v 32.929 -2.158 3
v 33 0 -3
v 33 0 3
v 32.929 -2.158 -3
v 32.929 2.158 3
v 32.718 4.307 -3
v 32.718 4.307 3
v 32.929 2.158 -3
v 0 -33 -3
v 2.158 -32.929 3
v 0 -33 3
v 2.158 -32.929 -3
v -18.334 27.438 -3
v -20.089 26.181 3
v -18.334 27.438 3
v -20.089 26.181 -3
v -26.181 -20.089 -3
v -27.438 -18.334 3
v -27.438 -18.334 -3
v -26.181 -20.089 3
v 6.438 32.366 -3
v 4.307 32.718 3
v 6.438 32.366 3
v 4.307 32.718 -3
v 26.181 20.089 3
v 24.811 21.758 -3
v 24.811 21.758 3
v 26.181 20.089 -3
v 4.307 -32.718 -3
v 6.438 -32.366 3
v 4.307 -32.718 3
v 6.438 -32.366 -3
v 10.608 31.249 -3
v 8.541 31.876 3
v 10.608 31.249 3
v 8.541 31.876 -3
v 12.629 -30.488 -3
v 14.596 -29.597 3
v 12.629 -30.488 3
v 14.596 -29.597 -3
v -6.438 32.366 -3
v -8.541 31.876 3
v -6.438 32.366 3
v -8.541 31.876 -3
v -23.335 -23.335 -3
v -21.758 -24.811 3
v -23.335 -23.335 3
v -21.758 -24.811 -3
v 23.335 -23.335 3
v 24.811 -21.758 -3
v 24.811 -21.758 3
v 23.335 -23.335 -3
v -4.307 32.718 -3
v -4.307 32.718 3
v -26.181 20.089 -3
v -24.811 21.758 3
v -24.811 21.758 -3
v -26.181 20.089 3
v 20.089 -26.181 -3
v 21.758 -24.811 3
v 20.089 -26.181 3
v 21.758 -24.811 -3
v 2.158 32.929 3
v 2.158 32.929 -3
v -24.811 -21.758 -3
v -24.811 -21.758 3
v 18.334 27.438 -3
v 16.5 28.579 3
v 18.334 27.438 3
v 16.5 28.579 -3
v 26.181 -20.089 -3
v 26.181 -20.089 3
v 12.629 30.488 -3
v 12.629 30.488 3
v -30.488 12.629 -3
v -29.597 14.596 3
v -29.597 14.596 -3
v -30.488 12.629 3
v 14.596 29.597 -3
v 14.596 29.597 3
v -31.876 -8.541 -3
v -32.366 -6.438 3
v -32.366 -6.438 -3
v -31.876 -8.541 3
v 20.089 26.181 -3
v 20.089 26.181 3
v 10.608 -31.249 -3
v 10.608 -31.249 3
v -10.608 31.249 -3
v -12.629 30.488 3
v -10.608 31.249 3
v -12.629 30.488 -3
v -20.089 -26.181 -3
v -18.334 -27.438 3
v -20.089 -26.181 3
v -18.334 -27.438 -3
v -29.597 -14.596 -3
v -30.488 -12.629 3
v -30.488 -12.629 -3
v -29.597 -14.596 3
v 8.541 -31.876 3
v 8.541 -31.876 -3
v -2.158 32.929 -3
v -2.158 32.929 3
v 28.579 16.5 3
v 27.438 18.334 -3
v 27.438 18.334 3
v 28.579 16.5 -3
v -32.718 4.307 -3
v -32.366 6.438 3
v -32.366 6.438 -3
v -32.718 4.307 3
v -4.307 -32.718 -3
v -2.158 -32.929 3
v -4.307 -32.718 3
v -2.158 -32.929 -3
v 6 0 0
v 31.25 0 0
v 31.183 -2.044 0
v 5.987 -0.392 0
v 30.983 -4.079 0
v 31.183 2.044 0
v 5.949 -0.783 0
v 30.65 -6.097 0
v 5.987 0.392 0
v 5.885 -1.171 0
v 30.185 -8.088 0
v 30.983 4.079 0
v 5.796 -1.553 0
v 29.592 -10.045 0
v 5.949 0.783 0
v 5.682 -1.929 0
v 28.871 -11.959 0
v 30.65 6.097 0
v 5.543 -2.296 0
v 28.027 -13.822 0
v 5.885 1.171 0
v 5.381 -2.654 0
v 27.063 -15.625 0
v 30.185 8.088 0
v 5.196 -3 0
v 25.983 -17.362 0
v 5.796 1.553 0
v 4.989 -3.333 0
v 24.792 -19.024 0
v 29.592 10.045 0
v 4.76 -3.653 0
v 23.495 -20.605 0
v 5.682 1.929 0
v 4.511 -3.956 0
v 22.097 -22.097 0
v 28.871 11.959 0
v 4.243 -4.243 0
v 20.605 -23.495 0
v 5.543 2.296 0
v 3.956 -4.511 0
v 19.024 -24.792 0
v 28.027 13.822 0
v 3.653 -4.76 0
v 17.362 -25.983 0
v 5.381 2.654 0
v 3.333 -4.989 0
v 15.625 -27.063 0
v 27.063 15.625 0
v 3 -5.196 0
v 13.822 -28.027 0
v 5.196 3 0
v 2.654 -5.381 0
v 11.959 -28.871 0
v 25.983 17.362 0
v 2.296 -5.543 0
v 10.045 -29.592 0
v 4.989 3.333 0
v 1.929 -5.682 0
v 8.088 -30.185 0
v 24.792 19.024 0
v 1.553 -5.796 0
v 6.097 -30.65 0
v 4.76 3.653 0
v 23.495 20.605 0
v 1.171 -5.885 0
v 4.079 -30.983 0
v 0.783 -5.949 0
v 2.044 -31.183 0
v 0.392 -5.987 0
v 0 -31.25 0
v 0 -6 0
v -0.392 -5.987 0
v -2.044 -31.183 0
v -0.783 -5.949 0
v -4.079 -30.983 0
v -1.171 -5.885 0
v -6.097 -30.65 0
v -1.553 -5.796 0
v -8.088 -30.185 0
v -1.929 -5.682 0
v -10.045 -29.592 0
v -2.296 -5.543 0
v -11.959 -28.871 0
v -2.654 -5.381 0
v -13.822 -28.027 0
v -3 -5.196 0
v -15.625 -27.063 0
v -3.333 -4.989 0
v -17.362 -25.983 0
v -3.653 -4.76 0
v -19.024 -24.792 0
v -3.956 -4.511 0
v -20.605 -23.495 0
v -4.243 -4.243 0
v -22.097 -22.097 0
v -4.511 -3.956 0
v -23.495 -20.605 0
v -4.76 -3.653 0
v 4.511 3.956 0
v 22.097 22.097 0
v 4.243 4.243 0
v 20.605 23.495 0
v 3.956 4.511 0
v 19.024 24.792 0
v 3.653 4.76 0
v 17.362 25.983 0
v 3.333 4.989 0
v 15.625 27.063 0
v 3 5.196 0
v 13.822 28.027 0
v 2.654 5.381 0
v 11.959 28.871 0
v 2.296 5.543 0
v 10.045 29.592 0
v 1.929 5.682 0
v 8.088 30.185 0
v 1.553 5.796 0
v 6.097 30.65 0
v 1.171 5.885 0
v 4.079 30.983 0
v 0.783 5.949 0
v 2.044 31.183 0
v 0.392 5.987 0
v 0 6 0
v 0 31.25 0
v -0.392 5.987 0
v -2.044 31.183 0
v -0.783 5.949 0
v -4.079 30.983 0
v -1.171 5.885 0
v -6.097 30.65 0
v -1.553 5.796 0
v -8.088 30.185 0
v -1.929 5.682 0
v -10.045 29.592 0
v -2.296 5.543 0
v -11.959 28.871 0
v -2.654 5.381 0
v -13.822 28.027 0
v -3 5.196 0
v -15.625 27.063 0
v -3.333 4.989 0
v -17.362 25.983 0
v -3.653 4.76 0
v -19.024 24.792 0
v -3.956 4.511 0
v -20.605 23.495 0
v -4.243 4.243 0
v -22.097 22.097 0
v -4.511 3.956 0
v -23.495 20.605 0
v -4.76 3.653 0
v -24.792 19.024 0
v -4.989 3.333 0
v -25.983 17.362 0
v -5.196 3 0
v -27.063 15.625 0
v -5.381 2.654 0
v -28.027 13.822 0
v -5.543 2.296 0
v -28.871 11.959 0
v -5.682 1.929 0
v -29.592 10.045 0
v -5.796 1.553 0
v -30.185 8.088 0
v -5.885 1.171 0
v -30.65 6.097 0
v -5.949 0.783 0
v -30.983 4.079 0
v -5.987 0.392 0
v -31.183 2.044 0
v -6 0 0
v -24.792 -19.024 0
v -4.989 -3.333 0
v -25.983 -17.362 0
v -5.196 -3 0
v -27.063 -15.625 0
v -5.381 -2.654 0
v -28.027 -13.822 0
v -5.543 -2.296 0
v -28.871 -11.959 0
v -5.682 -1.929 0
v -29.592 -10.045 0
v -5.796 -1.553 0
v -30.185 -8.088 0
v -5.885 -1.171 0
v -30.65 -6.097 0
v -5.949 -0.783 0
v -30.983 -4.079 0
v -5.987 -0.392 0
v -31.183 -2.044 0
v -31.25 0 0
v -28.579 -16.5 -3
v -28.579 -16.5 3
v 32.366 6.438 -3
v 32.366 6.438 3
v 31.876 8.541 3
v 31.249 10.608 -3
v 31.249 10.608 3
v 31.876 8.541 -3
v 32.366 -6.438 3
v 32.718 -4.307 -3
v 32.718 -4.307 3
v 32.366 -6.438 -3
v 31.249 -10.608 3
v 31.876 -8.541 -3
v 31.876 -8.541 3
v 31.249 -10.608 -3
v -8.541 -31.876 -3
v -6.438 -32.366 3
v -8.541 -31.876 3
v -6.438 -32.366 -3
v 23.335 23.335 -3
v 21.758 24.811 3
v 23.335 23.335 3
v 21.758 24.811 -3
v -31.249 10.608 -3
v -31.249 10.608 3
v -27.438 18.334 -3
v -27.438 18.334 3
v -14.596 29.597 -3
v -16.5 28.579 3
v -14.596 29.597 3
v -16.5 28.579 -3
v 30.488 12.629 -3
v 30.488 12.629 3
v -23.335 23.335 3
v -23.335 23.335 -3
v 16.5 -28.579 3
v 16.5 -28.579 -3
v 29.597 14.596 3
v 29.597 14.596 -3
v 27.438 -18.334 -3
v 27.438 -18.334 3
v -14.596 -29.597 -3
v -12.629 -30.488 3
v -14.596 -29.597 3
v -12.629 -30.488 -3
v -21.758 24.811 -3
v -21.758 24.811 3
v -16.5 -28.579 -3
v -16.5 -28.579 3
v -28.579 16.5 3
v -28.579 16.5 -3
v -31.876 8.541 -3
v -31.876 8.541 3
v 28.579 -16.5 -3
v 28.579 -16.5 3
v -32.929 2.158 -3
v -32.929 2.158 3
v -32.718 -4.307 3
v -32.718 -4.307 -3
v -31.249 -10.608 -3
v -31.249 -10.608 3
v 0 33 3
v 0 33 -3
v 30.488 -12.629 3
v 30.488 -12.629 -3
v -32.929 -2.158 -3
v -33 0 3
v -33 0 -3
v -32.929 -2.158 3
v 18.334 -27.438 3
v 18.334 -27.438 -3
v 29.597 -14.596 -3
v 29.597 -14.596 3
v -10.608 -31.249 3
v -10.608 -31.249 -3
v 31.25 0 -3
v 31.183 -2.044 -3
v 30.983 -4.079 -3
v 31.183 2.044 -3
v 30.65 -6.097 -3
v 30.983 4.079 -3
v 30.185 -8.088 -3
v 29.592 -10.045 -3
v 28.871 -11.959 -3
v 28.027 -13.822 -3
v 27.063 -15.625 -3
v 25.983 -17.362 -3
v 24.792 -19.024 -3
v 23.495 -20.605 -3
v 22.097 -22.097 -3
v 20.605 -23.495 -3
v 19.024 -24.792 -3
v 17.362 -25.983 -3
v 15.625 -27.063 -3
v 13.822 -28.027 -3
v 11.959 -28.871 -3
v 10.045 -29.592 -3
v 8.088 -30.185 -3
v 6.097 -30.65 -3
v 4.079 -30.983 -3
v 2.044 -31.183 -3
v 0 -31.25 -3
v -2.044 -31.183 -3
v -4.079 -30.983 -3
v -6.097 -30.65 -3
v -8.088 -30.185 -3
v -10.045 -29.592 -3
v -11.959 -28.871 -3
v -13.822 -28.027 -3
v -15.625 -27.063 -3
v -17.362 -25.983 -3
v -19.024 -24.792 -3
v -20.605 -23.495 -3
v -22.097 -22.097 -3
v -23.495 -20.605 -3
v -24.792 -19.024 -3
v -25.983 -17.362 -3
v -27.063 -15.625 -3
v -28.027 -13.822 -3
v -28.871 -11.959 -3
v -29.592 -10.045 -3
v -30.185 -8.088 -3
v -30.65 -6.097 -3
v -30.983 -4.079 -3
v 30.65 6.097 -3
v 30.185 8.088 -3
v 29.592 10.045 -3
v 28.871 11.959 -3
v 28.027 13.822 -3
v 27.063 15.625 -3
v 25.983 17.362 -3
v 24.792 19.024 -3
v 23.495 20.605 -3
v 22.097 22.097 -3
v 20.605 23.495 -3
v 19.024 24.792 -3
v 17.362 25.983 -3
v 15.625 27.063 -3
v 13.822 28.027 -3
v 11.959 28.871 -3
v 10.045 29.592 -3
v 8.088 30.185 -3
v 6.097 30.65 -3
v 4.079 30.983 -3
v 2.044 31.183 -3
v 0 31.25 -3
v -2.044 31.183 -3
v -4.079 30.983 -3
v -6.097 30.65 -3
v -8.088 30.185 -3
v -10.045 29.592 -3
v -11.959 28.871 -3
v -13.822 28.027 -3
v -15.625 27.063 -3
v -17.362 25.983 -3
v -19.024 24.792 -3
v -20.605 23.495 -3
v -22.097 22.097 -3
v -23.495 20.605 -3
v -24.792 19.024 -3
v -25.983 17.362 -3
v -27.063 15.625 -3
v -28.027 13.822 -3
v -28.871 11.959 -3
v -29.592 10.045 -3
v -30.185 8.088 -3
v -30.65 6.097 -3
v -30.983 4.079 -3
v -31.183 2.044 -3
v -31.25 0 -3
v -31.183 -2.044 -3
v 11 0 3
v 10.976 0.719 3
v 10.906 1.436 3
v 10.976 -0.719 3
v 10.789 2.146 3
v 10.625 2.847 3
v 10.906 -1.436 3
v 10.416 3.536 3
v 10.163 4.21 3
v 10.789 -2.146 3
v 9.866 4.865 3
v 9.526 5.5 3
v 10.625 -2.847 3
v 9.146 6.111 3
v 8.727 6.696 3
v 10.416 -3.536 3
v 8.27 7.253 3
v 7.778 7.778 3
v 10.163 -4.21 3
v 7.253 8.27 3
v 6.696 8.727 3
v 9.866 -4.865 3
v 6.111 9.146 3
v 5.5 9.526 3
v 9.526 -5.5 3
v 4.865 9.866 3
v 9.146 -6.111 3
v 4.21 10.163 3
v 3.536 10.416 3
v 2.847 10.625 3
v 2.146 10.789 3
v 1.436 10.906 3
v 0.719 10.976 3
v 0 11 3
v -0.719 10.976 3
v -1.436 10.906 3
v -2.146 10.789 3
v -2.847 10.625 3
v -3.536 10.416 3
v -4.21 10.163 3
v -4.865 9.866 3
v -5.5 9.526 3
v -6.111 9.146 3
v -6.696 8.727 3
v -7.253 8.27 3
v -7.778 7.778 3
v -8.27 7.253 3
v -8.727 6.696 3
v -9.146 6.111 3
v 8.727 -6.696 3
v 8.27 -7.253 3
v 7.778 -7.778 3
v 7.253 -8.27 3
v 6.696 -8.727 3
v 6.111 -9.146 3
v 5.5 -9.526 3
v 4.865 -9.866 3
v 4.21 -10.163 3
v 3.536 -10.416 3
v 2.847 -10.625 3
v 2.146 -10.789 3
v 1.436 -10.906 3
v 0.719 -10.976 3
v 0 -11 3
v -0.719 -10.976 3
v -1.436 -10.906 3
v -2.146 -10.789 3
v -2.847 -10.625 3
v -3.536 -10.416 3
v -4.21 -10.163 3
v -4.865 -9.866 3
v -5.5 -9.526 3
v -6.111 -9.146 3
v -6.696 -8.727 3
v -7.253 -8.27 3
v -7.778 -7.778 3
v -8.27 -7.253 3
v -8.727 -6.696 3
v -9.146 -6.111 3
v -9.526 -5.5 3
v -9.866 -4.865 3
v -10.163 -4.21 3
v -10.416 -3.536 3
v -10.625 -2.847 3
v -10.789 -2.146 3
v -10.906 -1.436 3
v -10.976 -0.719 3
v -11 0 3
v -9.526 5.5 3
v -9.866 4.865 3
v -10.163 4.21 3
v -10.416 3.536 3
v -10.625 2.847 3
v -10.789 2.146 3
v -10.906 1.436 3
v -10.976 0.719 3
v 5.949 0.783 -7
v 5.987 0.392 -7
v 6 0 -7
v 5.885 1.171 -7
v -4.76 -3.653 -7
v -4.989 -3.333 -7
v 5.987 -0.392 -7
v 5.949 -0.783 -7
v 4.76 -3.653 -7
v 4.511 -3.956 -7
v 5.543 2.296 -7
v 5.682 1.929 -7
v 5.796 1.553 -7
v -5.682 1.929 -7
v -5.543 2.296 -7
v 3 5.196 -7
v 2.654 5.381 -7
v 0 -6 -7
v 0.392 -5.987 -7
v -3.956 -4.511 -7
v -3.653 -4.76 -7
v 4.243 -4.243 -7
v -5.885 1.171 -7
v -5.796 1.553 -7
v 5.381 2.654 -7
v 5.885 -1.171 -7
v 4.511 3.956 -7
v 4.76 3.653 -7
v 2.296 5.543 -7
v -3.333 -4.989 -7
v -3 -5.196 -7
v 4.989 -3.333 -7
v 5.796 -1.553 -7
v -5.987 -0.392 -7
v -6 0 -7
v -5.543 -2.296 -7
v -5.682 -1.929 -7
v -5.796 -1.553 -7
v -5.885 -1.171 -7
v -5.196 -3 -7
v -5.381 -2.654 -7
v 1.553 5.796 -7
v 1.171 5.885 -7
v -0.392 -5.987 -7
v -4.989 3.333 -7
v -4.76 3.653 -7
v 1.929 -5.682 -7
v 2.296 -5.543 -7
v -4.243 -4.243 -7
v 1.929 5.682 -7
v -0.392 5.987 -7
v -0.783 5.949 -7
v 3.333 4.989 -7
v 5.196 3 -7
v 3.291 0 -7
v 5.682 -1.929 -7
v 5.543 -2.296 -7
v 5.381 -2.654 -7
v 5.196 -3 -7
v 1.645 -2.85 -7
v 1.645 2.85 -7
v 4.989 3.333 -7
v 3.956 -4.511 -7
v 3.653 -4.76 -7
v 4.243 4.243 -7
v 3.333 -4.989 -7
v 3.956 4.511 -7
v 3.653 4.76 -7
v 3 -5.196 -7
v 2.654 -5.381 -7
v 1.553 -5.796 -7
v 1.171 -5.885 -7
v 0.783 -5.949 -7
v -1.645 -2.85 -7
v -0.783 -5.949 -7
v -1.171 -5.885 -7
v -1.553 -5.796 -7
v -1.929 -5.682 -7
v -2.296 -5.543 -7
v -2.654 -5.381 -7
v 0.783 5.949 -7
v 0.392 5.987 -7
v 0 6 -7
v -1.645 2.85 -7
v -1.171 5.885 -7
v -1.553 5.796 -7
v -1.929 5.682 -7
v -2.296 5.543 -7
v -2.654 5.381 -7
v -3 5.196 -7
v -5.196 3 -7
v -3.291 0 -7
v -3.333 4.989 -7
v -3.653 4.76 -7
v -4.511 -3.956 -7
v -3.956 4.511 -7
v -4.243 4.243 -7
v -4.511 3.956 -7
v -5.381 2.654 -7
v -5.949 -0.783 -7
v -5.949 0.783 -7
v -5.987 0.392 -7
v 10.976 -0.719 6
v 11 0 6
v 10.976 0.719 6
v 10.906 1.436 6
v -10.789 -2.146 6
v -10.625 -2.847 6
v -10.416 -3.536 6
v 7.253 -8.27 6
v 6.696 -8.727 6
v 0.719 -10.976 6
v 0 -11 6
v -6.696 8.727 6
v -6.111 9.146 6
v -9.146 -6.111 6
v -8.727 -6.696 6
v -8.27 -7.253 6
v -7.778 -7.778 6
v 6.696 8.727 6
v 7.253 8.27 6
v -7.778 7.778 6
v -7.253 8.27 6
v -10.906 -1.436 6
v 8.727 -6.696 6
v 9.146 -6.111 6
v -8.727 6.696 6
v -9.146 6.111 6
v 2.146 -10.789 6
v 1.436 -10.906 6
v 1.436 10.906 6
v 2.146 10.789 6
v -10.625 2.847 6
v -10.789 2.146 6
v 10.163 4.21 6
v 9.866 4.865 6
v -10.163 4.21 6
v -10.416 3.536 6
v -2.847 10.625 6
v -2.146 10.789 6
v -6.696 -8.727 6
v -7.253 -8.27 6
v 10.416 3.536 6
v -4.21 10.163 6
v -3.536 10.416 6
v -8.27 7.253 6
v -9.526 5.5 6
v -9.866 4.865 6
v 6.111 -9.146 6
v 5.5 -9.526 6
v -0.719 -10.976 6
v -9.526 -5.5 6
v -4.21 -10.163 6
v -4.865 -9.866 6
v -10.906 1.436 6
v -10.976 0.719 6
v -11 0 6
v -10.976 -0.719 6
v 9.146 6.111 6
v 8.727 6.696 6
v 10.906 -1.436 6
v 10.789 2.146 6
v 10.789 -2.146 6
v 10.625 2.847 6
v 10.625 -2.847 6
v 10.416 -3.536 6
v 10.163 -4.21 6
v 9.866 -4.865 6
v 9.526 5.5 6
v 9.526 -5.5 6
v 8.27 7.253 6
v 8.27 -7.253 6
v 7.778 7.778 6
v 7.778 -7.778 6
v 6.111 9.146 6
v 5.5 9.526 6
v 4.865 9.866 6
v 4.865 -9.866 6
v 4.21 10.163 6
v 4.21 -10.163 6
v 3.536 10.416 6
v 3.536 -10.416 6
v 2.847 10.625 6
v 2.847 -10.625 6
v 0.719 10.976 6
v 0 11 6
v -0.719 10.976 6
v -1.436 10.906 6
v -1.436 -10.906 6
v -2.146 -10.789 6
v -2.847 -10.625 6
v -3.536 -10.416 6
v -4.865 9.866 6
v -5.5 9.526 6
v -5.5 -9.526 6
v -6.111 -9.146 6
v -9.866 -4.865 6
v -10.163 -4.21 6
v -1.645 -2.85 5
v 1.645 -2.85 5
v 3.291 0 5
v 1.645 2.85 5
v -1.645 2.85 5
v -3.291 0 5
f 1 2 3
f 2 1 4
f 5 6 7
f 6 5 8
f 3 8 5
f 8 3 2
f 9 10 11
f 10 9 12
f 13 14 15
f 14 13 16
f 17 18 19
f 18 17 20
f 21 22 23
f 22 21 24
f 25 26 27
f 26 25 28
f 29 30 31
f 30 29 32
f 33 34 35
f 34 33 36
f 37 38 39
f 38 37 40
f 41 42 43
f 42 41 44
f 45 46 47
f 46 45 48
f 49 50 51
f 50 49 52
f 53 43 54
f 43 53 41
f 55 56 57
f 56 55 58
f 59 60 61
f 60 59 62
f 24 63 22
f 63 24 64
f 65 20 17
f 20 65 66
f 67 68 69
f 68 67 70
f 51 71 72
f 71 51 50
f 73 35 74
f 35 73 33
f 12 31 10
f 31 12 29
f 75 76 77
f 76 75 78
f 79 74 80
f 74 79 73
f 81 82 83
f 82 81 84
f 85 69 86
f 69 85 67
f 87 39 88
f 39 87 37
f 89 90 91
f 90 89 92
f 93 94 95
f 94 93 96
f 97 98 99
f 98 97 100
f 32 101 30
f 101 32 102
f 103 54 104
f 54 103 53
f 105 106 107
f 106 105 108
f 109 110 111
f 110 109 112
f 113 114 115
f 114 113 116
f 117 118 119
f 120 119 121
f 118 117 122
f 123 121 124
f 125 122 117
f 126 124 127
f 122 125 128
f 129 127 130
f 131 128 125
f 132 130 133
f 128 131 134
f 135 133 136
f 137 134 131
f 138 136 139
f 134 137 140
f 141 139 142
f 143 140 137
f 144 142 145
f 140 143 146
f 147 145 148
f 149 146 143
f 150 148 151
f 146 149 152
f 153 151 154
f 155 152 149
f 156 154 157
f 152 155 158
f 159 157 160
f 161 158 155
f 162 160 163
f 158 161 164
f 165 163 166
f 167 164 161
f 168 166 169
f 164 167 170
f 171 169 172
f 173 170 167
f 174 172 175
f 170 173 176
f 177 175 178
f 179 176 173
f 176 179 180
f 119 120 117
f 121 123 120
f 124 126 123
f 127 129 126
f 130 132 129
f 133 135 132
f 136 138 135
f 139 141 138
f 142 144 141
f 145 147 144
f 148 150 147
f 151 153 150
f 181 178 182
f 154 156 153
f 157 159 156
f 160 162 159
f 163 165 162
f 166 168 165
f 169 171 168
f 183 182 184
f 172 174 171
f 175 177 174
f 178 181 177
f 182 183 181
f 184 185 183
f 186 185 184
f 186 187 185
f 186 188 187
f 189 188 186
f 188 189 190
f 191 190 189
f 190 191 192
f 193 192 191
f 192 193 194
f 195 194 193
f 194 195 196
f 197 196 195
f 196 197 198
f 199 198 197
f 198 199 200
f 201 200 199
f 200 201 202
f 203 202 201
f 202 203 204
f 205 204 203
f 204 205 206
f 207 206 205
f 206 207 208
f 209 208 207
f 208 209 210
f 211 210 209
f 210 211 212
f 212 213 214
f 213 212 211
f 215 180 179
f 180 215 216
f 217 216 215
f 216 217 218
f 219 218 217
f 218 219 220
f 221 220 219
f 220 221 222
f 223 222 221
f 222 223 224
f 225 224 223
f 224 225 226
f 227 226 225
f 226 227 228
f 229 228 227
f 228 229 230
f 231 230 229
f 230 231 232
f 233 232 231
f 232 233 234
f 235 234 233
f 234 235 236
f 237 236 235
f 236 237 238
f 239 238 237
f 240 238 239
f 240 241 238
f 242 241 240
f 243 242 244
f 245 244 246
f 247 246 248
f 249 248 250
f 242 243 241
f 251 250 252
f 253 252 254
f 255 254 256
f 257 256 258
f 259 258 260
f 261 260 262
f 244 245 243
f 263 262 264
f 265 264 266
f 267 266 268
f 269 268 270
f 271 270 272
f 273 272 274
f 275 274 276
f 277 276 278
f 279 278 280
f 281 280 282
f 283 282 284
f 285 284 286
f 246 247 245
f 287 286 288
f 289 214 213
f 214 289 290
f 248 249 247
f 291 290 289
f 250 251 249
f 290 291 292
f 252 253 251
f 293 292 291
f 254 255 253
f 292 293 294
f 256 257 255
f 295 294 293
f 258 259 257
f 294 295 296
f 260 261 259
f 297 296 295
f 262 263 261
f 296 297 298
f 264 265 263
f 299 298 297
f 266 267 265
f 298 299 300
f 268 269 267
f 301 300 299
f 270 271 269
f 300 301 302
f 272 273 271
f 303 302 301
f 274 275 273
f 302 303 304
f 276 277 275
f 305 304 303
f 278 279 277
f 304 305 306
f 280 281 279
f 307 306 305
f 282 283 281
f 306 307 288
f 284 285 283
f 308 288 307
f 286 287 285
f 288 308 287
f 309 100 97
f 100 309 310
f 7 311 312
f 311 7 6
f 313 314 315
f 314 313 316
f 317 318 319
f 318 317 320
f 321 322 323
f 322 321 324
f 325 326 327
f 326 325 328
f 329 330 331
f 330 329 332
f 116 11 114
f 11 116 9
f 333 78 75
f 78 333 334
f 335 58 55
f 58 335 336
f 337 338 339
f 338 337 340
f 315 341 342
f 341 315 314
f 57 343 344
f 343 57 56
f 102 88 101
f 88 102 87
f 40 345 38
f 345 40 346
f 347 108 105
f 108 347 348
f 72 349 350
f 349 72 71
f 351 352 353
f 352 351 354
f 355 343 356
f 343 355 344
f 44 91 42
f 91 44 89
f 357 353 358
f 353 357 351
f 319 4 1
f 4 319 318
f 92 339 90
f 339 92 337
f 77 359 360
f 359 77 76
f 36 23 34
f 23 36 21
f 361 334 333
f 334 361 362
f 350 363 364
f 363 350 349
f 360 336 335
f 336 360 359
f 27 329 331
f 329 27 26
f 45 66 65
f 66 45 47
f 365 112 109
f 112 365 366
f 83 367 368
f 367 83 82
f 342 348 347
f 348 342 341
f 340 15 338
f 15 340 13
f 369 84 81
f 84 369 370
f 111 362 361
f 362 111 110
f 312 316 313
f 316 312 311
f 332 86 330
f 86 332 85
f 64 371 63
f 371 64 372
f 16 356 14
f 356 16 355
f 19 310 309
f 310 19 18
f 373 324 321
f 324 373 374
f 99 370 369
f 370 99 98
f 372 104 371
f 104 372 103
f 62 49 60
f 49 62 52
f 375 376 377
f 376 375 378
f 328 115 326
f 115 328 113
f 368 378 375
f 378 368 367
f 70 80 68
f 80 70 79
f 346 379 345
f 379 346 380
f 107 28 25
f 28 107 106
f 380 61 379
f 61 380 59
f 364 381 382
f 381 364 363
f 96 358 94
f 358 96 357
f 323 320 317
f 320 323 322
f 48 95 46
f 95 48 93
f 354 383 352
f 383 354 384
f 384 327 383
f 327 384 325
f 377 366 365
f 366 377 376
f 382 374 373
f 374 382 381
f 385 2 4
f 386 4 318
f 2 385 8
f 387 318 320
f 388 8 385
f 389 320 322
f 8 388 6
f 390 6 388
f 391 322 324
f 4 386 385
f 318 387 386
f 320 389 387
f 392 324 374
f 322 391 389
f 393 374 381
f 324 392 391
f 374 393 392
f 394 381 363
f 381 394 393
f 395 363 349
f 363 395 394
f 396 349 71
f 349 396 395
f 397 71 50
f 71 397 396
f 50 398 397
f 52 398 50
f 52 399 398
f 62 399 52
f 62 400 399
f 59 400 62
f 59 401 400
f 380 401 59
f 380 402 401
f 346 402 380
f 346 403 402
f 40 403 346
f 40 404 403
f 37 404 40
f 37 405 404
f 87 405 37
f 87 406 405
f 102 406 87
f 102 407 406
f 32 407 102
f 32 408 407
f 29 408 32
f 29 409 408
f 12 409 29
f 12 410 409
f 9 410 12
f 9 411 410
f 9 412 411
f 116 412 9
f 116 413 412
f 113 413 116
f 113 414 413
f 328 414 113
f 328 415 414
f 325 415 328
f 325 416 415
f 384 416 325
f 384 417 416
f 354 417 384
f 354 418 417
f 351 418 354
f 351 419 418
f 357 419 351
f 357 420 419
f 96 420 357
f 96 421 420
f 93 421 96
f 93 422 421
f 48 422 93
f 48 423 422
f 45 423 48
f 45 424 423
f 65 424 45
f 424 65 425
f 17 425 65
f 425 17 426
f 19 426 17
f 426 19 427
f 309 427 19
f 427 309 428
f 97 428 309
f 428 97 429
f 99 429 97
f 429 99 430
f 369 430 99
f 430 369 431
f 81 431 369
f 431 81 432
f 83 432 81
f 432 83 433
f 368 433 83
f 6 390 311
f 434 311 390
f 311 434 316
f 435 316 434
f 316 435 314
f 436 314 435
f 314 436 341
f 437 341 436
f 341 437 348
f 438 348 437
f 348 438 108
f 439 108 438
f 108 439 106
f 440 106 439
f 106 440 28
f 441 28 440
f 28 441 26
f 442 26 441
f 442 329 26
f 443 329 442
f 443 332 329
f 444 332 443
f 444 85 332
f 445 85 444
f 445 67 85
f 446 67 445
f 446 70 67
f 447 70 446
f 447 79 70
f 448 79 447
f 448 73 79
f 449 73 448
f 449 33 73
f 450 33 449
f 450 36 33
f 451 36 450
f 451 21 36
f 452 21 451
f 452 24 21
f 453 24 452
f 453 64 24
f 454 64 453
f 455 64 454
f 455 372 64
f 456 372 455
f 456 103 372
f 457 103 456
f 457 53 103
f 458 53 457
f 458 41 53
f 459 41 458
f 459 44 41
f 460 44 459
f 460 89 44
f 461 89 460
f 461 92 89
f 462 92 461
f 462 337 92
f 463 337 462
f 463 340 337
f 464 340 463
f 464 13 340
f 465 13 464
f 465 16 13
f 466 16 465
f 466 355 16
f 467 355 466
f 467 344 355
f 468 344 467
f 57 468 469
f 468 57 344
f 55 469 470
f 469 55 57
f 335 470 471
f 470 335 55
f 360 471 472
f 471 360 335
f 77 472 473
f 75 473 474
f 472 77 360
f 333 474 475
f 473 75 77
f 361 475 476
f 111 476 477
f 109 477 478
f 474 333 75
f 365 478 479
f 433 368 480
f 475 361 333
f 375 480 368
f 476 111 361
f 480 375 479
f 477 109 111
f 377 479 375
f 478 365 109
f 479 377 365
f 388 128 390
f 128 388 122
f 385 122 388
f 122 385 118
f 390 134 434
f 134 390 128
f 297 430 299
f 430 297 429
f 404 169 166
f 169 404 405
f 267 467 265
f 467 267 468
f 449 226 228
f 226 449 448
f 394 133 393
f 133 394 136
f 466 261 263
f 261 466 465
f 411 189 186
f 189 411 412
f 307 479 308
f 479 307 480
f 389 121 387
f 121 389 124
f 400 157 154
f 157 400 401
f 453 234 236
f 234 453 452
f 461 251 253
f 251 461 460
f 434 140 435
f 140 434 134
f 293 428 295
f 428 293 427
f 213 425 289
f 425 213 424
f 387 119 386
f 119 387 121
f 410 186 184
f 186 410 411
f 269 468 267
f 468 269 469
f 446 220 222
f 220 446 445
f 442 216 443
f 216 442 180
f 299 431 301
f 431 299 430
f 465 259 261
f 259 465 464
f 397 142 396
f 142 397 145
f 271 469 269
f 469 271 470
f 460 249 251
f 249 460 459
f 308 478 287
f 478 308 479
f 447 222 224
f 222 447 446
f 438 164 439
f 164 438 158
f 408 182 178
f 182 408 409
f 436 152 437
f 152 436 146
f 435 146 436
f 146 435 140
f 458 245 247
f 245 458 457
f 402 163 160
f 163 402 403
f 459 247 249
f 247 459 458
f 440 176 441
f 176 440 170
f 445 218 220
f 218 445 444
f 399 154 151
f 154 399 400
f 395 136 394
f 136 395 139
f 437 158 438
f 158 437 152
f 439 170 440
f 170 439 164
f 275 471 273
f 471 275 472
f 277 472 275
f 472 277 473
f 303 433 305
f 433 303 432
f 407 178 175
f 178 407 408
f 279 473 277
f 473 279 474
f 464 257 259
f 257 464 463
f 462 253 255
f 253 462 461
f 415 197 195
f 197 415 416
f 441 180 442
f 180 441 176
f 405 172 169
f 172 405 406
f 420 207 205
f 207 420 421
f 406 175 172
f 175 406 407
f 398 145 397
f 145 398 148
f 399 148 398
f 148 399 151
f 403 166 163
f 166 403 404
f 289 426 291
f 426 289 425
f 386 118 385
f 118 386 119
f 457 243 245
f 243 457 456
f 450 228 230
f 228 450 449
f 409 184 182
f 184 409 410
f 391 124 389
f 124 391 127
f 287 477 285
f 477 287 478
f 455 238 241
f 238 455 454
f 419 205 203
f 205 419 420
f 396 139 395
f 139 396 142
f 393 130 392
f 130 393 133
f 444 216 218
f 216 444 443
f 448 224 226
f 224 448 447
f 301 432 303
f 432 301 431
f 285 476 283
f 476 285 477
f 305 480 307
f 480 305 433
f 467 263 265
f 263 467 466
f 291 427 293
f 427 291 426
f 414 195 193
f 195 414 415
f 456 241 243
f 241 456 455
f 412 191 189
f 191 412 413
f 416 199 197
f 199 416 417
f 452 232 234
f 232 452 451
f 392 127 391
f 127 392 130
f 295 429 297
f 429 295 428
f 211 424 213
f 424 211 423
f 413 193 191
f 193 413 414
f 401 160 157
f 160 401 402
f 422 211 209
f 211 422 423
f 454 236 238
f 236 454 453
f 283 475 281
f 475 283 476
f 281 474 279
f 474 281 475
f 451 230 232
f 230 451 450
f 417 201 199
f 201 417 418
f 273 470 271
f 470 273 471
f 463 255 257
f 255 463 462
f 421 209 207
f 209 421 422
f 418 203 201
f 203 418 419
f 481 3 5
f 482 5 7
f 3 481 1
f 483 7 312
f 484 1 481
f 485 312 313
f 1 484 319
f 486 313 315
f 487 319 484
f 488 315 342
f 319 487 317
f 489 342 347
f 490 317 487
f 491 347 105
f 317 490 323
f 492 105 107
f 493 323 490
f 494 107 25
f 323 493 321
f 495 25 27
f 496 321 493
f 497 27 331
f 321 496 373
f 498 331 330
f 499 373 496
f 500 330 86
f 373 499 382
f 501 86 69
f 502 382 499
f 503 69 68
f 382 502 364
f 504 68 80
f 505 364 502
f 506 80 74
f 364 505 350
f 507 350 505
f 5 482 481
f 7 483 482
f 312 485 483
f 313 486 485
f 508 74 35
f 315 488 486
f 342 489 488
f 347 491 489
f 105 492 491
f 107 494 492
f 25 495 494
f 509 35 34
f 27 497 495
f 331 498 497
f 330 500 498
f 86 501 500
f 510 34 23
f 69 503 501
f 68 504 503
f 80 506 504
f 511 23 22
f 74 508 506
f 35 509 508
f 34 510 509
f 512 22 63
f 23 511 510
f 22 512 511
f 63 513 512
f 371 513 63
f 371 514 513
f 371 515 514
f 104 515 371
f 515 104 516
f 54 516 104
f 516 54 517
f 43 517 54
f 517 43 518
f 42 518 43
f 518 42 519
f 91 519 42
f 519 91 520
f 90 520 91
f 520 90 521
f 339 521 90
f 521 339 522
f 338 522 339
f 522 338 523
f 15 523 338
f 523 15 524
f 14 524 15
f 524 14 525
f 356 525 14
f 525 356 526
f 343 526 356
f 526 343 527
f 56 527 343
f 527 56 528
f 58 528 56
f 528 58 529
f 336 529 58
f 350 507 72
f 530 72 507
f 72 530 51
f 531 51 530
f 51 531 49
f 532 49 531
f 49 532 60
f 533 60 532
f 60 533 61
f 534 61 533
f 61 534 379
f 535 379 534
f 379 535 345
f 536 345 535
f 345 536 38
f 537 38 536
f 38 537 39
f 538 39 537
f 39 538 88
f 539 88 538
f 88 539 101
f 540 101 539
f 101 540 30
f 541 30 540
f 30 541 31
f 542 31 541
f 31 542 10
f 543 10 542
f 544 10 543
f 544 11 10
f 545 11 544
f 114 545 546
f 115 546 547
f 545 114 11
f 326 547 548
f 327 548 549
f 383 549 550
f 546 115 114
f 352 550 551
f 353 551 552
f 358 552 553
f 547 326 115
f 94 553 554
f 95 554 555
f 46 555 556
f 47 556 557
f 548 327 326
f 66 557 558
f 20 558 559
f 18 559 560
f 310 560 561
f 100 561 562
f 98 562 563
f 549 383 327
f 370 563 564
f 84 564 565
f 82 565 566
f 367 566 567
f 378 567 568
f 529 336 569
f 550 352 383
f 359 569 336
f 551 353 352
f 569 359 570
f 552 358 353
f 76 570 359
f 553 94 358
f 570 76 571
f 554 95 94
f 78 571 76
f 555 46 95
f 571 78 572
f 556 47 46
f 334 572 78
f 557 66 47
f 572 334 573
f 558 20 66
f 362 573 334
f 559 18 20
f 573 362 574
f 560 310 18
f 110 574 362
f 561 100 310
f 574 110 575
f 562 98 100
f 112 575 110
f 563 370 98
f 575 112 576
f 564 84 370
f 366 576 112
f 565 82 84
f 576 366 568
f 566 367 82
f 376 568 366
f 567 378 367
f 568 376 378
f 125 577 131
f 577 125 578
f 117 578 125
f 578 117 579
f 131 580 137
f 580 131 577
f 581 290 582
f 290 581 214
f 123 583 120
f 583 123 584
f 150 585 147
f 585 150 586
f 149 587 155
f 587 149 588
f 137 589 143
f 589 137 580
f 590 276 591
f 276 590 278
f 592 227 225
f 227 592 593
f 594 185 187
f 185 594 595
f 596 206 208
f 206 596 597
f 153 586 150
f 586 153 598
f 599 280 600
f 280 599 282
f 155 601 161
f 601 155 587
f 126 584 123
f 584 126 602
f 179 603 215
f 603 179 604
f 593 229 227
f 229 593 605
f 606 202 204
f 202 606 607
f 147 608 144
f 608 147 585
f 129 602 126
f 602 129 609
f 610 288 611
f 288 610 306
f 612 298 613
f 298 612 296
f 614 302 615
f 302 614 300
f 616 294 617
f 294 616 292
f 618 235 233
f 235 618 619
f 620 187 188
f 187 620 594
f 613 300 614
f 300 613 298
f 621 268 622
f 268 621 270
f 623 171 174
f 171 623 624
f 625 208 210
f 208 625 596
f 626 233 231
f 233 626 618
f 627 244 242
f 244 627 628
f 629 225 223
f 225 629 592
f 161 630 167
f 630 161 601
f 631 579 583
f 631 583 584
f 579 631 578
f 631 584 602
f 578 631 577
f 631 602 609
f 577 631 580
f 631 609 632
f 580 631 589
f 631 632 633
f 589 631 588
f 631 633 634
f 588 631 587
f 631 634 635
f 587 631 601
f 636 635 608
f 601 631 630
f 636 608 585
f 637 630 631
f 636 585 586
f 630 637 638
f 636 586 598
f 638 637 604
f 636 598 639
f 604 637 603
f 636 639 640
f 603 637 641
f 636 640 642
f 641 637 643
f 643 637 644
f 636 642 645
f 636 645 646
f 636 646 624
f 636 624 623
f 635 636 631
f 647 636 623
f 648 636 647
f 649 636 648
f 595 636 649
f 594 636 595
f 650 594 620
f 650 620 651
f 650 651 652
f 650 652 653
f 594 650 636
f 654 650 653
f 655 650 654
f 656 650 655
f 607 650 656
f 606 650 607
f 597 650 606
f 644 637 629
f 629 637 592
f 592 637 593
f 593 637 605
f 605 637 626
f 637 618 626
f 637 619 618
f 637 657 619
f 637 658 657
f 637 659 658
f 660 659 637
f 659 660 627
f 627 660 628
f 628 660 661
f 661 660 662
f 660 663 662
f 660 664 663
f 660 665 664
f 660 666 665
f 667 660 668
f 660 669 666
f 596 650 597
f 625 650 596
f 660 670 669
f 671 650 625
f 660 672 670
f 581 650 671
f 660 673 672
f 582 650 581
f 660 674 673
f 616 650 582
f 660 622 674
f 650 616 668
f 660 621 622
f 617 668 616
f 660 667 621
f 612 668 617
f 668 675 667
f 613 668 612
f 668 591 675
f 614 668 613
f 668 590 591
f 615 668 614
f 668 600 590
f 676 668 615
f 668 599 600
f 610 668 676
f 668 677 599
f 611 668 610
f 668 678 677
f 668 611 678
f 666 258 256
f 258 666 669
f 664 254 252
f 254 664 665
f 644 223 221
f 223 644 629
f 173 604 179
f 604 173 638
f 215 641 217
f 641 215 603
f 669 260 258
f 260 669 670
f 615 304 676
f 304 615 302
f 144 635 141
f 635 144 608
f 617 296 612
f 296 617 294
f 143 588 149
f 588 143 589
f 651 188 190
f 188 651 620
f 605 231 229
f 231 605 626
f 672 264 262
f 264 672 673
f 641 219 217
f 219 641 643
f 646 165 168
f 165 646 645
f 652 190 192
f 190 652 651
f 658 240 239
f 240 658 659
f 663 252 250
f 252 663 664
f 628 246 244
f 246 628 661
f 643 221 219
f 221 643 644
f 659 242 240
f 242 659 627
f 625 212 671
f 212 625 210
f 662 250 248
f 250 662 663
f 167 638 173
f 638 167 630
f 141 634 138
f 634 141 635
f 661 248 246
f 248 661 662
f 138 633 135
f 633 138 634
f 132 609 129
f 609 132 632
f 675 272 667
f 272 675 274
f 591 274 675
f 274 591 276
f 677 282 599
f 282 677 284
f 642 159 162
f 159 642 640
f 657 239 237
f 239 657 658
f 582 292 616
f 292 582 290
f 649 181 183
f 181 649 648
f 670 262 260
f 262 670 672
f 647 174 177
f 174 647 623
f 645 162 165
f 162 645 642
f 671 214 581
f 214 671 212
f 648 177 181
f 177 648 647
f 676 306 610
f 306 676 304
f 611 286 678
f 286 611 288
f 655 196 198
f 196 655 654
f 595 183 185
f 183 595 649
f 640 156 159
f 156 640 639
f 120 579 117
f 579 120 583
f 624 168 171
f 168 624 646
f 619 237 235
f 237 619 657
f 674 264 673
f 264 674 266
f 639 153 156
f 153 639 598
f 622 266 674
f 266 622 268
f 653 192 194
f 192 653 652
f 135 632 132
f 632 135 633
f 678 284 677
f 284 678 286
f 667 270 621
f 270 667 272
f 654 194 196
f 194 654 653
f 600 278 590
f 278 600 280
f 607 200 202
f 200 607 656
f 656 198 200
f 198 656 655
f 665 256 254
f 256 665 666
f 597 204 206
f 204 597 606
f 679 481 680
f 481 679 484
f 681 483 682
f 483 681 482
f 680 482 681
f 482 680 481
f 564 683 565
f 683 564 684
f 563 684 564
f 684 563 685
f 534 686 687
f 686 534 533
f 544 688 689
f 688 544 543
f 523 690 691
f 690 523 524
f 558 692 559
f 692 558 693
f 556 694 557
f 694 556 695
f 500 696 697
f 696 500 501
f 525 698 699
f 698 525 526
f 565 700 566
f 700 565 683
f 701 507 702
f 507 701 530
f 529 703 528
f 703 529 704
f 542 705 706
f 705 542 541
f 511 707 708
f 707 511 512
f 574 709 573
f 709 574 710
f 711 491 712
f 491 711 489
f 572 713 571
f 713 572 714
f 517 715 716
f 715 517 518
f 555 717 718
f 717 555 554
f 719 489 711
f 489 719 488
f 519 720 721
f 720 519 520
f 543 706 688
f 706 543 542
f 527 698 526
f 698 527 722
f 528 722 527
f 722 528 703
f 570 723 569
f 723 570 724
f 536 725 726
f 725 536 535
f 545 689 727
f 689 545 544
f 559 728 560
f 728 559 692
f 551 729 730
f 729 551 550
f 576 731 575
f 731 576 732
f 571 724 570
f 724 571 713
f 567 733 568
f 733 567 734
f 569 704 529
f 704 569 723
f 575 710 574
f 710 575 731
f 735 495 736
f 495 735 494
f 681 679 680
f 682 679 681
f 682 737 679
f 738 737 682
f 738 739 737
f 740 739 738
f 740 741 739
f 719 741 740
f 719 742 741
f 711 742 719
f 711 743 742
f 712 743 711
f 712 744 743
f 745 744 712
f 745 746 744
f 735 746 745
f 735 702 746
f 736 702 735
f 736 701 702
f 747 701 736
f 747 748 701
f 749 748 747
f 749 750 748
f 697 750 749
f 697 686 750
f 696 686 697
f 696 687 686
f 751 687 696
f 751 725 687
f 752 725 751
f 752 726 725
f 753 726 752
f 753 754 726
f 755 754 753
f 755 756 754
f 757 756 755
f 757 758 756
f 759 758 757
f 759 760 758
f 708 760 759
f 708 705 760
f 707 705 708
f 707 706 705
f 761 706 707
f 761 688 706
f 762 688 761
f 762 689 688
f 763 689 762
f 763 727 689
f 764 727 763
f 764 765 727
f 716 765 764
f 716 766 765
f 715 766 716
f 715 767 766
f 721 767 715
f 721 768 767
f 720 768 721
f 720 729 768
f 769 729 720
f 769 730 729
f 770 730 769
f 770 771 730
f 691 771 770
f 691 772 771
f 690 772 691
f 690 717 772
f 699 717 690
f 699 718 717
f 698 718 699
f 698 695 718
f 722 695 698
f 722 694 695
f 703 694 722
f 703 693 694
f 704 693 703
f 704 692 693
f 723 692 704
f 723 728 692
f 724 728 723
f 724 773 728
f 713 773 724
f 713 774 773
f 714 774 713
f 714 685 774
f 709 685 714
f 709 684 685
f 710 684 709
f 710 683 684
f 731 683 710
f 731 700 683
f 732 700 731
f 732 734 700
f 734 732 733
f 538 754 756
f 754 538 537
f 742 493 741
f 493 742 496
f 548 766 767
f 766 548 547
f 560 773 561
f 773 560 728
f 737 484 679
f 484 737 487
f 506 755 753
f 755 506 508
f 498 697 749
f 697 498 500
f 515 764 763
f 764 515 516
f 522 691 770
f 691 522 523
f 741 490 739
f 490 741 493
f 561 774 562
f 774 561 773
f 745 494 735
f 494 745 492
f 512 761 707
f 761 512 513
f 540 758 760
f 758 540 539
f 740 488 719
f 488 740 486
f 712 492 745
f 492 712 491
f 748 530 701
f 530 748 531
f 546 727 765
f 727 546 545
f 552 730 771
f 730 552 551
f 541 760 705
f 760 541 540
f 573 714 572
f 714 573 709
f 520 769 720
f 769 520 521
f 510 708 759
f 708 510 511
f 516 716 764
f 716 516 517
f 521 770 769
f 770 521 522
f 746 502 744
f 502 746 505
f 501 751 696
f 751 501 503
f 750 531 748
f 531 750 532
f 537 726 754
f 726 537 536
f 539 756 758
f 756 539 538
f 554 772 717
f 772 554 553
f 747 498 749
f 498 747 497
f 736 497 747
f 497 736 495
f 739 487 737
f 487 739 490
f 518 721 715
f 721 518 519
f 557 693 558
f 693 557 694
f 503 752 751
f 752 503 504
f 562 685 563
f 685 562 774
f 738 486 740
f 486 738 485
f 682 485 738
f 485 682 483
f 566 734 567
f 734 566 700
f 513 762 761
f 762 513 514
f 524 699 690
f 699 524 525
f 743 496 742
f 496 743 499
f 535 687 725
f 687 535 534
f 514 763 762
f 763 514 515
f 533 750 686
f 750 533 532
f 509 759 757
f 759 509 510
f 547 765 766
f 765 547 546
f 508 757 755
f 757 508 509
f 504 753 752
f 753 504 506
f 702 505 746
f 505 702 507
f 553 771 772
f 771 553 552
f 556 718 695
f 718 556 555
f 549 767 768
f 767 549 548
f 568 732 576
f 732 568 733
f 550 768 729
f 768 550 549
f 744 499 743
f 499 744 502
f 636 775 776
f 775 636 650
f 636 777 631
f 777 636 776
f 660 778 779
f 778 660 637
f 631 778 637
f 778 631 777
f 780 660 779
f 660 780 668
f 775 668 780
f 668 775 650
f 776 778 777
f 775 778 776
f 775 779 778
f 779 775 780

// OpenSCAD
// C40 dust cap — umbrella type (light & fast to print)
// Sits on the body's top rim; a hex socket on the underside engages
// the drive shaft's hex to centre and hold it.
// Shaft hex: 5.5mm across flats (community data from a motorised
// adapter project; not an official spec). Socket modelled at 5.7mm
// = light fit, per the owner's preference (2026-11-26).
// The cup type lives in c40-dust-cap-v1.scad; this is the flat variant.

$fn = 96;

// --- parameters (mm) ---
disk_d       = 66;   // canopy diameter (body is ~60-61)
disk_t       = 3;    // canopy thickness
skirt_h      = 3;    // centring skirt height below the disk
skirt_in_d   = 62.5; // skirt inner diameter (body OD ~61 + clearance)
boss_d       = 12;   // centre boss outer diameter
boss_h       = 7;    // boss protrusion below disk underside
hex_af       = 5.7;  // hex socket across-flats (light fit on 5.5)
socket_depth = 12;   // socket depth measured from boss tip
grip_d       = 22;   // top grip bump diameter
grip_h       = 3;    // top grip bump height

module hex_prism(af, h) {
  // 6-facet cylinder sized so the across-flats distance equals af
  cylinder(h = h, r = af / sqrt(3), $fn = 6);
}

module umbrella_cap() {
  difference() {
    union() {
      // canopy disk
      cylinder(h = disk_t, d = disk_d);
      // centring skirt (ring that hugs the body's top outside)
      translate([0, 0, -skirt_h])
        difference() {
          cylinder(h = skirt_h, d = disk_d);
          translate([0, 0, -0.1]) cylinder(h = skirt_h + 0.2, d = skirt_in_d);
        }
      // centre boss reaching down to the shaft hex
      translate([0, 0, -boss_h]) cylinder(h = boss_h, d = boss_d);
      // top grip bump
      translate([0, 0, disk_t]) cylinder(h = grip_h, d = grip_d);
    }
    // hex socket (blind, opens at the boss tip)
    translate([0, 0, -boss_h - 0.1]) hex_prism(hex_af, socket_depth + 0.1);
  }
}

umbrella_cap();
